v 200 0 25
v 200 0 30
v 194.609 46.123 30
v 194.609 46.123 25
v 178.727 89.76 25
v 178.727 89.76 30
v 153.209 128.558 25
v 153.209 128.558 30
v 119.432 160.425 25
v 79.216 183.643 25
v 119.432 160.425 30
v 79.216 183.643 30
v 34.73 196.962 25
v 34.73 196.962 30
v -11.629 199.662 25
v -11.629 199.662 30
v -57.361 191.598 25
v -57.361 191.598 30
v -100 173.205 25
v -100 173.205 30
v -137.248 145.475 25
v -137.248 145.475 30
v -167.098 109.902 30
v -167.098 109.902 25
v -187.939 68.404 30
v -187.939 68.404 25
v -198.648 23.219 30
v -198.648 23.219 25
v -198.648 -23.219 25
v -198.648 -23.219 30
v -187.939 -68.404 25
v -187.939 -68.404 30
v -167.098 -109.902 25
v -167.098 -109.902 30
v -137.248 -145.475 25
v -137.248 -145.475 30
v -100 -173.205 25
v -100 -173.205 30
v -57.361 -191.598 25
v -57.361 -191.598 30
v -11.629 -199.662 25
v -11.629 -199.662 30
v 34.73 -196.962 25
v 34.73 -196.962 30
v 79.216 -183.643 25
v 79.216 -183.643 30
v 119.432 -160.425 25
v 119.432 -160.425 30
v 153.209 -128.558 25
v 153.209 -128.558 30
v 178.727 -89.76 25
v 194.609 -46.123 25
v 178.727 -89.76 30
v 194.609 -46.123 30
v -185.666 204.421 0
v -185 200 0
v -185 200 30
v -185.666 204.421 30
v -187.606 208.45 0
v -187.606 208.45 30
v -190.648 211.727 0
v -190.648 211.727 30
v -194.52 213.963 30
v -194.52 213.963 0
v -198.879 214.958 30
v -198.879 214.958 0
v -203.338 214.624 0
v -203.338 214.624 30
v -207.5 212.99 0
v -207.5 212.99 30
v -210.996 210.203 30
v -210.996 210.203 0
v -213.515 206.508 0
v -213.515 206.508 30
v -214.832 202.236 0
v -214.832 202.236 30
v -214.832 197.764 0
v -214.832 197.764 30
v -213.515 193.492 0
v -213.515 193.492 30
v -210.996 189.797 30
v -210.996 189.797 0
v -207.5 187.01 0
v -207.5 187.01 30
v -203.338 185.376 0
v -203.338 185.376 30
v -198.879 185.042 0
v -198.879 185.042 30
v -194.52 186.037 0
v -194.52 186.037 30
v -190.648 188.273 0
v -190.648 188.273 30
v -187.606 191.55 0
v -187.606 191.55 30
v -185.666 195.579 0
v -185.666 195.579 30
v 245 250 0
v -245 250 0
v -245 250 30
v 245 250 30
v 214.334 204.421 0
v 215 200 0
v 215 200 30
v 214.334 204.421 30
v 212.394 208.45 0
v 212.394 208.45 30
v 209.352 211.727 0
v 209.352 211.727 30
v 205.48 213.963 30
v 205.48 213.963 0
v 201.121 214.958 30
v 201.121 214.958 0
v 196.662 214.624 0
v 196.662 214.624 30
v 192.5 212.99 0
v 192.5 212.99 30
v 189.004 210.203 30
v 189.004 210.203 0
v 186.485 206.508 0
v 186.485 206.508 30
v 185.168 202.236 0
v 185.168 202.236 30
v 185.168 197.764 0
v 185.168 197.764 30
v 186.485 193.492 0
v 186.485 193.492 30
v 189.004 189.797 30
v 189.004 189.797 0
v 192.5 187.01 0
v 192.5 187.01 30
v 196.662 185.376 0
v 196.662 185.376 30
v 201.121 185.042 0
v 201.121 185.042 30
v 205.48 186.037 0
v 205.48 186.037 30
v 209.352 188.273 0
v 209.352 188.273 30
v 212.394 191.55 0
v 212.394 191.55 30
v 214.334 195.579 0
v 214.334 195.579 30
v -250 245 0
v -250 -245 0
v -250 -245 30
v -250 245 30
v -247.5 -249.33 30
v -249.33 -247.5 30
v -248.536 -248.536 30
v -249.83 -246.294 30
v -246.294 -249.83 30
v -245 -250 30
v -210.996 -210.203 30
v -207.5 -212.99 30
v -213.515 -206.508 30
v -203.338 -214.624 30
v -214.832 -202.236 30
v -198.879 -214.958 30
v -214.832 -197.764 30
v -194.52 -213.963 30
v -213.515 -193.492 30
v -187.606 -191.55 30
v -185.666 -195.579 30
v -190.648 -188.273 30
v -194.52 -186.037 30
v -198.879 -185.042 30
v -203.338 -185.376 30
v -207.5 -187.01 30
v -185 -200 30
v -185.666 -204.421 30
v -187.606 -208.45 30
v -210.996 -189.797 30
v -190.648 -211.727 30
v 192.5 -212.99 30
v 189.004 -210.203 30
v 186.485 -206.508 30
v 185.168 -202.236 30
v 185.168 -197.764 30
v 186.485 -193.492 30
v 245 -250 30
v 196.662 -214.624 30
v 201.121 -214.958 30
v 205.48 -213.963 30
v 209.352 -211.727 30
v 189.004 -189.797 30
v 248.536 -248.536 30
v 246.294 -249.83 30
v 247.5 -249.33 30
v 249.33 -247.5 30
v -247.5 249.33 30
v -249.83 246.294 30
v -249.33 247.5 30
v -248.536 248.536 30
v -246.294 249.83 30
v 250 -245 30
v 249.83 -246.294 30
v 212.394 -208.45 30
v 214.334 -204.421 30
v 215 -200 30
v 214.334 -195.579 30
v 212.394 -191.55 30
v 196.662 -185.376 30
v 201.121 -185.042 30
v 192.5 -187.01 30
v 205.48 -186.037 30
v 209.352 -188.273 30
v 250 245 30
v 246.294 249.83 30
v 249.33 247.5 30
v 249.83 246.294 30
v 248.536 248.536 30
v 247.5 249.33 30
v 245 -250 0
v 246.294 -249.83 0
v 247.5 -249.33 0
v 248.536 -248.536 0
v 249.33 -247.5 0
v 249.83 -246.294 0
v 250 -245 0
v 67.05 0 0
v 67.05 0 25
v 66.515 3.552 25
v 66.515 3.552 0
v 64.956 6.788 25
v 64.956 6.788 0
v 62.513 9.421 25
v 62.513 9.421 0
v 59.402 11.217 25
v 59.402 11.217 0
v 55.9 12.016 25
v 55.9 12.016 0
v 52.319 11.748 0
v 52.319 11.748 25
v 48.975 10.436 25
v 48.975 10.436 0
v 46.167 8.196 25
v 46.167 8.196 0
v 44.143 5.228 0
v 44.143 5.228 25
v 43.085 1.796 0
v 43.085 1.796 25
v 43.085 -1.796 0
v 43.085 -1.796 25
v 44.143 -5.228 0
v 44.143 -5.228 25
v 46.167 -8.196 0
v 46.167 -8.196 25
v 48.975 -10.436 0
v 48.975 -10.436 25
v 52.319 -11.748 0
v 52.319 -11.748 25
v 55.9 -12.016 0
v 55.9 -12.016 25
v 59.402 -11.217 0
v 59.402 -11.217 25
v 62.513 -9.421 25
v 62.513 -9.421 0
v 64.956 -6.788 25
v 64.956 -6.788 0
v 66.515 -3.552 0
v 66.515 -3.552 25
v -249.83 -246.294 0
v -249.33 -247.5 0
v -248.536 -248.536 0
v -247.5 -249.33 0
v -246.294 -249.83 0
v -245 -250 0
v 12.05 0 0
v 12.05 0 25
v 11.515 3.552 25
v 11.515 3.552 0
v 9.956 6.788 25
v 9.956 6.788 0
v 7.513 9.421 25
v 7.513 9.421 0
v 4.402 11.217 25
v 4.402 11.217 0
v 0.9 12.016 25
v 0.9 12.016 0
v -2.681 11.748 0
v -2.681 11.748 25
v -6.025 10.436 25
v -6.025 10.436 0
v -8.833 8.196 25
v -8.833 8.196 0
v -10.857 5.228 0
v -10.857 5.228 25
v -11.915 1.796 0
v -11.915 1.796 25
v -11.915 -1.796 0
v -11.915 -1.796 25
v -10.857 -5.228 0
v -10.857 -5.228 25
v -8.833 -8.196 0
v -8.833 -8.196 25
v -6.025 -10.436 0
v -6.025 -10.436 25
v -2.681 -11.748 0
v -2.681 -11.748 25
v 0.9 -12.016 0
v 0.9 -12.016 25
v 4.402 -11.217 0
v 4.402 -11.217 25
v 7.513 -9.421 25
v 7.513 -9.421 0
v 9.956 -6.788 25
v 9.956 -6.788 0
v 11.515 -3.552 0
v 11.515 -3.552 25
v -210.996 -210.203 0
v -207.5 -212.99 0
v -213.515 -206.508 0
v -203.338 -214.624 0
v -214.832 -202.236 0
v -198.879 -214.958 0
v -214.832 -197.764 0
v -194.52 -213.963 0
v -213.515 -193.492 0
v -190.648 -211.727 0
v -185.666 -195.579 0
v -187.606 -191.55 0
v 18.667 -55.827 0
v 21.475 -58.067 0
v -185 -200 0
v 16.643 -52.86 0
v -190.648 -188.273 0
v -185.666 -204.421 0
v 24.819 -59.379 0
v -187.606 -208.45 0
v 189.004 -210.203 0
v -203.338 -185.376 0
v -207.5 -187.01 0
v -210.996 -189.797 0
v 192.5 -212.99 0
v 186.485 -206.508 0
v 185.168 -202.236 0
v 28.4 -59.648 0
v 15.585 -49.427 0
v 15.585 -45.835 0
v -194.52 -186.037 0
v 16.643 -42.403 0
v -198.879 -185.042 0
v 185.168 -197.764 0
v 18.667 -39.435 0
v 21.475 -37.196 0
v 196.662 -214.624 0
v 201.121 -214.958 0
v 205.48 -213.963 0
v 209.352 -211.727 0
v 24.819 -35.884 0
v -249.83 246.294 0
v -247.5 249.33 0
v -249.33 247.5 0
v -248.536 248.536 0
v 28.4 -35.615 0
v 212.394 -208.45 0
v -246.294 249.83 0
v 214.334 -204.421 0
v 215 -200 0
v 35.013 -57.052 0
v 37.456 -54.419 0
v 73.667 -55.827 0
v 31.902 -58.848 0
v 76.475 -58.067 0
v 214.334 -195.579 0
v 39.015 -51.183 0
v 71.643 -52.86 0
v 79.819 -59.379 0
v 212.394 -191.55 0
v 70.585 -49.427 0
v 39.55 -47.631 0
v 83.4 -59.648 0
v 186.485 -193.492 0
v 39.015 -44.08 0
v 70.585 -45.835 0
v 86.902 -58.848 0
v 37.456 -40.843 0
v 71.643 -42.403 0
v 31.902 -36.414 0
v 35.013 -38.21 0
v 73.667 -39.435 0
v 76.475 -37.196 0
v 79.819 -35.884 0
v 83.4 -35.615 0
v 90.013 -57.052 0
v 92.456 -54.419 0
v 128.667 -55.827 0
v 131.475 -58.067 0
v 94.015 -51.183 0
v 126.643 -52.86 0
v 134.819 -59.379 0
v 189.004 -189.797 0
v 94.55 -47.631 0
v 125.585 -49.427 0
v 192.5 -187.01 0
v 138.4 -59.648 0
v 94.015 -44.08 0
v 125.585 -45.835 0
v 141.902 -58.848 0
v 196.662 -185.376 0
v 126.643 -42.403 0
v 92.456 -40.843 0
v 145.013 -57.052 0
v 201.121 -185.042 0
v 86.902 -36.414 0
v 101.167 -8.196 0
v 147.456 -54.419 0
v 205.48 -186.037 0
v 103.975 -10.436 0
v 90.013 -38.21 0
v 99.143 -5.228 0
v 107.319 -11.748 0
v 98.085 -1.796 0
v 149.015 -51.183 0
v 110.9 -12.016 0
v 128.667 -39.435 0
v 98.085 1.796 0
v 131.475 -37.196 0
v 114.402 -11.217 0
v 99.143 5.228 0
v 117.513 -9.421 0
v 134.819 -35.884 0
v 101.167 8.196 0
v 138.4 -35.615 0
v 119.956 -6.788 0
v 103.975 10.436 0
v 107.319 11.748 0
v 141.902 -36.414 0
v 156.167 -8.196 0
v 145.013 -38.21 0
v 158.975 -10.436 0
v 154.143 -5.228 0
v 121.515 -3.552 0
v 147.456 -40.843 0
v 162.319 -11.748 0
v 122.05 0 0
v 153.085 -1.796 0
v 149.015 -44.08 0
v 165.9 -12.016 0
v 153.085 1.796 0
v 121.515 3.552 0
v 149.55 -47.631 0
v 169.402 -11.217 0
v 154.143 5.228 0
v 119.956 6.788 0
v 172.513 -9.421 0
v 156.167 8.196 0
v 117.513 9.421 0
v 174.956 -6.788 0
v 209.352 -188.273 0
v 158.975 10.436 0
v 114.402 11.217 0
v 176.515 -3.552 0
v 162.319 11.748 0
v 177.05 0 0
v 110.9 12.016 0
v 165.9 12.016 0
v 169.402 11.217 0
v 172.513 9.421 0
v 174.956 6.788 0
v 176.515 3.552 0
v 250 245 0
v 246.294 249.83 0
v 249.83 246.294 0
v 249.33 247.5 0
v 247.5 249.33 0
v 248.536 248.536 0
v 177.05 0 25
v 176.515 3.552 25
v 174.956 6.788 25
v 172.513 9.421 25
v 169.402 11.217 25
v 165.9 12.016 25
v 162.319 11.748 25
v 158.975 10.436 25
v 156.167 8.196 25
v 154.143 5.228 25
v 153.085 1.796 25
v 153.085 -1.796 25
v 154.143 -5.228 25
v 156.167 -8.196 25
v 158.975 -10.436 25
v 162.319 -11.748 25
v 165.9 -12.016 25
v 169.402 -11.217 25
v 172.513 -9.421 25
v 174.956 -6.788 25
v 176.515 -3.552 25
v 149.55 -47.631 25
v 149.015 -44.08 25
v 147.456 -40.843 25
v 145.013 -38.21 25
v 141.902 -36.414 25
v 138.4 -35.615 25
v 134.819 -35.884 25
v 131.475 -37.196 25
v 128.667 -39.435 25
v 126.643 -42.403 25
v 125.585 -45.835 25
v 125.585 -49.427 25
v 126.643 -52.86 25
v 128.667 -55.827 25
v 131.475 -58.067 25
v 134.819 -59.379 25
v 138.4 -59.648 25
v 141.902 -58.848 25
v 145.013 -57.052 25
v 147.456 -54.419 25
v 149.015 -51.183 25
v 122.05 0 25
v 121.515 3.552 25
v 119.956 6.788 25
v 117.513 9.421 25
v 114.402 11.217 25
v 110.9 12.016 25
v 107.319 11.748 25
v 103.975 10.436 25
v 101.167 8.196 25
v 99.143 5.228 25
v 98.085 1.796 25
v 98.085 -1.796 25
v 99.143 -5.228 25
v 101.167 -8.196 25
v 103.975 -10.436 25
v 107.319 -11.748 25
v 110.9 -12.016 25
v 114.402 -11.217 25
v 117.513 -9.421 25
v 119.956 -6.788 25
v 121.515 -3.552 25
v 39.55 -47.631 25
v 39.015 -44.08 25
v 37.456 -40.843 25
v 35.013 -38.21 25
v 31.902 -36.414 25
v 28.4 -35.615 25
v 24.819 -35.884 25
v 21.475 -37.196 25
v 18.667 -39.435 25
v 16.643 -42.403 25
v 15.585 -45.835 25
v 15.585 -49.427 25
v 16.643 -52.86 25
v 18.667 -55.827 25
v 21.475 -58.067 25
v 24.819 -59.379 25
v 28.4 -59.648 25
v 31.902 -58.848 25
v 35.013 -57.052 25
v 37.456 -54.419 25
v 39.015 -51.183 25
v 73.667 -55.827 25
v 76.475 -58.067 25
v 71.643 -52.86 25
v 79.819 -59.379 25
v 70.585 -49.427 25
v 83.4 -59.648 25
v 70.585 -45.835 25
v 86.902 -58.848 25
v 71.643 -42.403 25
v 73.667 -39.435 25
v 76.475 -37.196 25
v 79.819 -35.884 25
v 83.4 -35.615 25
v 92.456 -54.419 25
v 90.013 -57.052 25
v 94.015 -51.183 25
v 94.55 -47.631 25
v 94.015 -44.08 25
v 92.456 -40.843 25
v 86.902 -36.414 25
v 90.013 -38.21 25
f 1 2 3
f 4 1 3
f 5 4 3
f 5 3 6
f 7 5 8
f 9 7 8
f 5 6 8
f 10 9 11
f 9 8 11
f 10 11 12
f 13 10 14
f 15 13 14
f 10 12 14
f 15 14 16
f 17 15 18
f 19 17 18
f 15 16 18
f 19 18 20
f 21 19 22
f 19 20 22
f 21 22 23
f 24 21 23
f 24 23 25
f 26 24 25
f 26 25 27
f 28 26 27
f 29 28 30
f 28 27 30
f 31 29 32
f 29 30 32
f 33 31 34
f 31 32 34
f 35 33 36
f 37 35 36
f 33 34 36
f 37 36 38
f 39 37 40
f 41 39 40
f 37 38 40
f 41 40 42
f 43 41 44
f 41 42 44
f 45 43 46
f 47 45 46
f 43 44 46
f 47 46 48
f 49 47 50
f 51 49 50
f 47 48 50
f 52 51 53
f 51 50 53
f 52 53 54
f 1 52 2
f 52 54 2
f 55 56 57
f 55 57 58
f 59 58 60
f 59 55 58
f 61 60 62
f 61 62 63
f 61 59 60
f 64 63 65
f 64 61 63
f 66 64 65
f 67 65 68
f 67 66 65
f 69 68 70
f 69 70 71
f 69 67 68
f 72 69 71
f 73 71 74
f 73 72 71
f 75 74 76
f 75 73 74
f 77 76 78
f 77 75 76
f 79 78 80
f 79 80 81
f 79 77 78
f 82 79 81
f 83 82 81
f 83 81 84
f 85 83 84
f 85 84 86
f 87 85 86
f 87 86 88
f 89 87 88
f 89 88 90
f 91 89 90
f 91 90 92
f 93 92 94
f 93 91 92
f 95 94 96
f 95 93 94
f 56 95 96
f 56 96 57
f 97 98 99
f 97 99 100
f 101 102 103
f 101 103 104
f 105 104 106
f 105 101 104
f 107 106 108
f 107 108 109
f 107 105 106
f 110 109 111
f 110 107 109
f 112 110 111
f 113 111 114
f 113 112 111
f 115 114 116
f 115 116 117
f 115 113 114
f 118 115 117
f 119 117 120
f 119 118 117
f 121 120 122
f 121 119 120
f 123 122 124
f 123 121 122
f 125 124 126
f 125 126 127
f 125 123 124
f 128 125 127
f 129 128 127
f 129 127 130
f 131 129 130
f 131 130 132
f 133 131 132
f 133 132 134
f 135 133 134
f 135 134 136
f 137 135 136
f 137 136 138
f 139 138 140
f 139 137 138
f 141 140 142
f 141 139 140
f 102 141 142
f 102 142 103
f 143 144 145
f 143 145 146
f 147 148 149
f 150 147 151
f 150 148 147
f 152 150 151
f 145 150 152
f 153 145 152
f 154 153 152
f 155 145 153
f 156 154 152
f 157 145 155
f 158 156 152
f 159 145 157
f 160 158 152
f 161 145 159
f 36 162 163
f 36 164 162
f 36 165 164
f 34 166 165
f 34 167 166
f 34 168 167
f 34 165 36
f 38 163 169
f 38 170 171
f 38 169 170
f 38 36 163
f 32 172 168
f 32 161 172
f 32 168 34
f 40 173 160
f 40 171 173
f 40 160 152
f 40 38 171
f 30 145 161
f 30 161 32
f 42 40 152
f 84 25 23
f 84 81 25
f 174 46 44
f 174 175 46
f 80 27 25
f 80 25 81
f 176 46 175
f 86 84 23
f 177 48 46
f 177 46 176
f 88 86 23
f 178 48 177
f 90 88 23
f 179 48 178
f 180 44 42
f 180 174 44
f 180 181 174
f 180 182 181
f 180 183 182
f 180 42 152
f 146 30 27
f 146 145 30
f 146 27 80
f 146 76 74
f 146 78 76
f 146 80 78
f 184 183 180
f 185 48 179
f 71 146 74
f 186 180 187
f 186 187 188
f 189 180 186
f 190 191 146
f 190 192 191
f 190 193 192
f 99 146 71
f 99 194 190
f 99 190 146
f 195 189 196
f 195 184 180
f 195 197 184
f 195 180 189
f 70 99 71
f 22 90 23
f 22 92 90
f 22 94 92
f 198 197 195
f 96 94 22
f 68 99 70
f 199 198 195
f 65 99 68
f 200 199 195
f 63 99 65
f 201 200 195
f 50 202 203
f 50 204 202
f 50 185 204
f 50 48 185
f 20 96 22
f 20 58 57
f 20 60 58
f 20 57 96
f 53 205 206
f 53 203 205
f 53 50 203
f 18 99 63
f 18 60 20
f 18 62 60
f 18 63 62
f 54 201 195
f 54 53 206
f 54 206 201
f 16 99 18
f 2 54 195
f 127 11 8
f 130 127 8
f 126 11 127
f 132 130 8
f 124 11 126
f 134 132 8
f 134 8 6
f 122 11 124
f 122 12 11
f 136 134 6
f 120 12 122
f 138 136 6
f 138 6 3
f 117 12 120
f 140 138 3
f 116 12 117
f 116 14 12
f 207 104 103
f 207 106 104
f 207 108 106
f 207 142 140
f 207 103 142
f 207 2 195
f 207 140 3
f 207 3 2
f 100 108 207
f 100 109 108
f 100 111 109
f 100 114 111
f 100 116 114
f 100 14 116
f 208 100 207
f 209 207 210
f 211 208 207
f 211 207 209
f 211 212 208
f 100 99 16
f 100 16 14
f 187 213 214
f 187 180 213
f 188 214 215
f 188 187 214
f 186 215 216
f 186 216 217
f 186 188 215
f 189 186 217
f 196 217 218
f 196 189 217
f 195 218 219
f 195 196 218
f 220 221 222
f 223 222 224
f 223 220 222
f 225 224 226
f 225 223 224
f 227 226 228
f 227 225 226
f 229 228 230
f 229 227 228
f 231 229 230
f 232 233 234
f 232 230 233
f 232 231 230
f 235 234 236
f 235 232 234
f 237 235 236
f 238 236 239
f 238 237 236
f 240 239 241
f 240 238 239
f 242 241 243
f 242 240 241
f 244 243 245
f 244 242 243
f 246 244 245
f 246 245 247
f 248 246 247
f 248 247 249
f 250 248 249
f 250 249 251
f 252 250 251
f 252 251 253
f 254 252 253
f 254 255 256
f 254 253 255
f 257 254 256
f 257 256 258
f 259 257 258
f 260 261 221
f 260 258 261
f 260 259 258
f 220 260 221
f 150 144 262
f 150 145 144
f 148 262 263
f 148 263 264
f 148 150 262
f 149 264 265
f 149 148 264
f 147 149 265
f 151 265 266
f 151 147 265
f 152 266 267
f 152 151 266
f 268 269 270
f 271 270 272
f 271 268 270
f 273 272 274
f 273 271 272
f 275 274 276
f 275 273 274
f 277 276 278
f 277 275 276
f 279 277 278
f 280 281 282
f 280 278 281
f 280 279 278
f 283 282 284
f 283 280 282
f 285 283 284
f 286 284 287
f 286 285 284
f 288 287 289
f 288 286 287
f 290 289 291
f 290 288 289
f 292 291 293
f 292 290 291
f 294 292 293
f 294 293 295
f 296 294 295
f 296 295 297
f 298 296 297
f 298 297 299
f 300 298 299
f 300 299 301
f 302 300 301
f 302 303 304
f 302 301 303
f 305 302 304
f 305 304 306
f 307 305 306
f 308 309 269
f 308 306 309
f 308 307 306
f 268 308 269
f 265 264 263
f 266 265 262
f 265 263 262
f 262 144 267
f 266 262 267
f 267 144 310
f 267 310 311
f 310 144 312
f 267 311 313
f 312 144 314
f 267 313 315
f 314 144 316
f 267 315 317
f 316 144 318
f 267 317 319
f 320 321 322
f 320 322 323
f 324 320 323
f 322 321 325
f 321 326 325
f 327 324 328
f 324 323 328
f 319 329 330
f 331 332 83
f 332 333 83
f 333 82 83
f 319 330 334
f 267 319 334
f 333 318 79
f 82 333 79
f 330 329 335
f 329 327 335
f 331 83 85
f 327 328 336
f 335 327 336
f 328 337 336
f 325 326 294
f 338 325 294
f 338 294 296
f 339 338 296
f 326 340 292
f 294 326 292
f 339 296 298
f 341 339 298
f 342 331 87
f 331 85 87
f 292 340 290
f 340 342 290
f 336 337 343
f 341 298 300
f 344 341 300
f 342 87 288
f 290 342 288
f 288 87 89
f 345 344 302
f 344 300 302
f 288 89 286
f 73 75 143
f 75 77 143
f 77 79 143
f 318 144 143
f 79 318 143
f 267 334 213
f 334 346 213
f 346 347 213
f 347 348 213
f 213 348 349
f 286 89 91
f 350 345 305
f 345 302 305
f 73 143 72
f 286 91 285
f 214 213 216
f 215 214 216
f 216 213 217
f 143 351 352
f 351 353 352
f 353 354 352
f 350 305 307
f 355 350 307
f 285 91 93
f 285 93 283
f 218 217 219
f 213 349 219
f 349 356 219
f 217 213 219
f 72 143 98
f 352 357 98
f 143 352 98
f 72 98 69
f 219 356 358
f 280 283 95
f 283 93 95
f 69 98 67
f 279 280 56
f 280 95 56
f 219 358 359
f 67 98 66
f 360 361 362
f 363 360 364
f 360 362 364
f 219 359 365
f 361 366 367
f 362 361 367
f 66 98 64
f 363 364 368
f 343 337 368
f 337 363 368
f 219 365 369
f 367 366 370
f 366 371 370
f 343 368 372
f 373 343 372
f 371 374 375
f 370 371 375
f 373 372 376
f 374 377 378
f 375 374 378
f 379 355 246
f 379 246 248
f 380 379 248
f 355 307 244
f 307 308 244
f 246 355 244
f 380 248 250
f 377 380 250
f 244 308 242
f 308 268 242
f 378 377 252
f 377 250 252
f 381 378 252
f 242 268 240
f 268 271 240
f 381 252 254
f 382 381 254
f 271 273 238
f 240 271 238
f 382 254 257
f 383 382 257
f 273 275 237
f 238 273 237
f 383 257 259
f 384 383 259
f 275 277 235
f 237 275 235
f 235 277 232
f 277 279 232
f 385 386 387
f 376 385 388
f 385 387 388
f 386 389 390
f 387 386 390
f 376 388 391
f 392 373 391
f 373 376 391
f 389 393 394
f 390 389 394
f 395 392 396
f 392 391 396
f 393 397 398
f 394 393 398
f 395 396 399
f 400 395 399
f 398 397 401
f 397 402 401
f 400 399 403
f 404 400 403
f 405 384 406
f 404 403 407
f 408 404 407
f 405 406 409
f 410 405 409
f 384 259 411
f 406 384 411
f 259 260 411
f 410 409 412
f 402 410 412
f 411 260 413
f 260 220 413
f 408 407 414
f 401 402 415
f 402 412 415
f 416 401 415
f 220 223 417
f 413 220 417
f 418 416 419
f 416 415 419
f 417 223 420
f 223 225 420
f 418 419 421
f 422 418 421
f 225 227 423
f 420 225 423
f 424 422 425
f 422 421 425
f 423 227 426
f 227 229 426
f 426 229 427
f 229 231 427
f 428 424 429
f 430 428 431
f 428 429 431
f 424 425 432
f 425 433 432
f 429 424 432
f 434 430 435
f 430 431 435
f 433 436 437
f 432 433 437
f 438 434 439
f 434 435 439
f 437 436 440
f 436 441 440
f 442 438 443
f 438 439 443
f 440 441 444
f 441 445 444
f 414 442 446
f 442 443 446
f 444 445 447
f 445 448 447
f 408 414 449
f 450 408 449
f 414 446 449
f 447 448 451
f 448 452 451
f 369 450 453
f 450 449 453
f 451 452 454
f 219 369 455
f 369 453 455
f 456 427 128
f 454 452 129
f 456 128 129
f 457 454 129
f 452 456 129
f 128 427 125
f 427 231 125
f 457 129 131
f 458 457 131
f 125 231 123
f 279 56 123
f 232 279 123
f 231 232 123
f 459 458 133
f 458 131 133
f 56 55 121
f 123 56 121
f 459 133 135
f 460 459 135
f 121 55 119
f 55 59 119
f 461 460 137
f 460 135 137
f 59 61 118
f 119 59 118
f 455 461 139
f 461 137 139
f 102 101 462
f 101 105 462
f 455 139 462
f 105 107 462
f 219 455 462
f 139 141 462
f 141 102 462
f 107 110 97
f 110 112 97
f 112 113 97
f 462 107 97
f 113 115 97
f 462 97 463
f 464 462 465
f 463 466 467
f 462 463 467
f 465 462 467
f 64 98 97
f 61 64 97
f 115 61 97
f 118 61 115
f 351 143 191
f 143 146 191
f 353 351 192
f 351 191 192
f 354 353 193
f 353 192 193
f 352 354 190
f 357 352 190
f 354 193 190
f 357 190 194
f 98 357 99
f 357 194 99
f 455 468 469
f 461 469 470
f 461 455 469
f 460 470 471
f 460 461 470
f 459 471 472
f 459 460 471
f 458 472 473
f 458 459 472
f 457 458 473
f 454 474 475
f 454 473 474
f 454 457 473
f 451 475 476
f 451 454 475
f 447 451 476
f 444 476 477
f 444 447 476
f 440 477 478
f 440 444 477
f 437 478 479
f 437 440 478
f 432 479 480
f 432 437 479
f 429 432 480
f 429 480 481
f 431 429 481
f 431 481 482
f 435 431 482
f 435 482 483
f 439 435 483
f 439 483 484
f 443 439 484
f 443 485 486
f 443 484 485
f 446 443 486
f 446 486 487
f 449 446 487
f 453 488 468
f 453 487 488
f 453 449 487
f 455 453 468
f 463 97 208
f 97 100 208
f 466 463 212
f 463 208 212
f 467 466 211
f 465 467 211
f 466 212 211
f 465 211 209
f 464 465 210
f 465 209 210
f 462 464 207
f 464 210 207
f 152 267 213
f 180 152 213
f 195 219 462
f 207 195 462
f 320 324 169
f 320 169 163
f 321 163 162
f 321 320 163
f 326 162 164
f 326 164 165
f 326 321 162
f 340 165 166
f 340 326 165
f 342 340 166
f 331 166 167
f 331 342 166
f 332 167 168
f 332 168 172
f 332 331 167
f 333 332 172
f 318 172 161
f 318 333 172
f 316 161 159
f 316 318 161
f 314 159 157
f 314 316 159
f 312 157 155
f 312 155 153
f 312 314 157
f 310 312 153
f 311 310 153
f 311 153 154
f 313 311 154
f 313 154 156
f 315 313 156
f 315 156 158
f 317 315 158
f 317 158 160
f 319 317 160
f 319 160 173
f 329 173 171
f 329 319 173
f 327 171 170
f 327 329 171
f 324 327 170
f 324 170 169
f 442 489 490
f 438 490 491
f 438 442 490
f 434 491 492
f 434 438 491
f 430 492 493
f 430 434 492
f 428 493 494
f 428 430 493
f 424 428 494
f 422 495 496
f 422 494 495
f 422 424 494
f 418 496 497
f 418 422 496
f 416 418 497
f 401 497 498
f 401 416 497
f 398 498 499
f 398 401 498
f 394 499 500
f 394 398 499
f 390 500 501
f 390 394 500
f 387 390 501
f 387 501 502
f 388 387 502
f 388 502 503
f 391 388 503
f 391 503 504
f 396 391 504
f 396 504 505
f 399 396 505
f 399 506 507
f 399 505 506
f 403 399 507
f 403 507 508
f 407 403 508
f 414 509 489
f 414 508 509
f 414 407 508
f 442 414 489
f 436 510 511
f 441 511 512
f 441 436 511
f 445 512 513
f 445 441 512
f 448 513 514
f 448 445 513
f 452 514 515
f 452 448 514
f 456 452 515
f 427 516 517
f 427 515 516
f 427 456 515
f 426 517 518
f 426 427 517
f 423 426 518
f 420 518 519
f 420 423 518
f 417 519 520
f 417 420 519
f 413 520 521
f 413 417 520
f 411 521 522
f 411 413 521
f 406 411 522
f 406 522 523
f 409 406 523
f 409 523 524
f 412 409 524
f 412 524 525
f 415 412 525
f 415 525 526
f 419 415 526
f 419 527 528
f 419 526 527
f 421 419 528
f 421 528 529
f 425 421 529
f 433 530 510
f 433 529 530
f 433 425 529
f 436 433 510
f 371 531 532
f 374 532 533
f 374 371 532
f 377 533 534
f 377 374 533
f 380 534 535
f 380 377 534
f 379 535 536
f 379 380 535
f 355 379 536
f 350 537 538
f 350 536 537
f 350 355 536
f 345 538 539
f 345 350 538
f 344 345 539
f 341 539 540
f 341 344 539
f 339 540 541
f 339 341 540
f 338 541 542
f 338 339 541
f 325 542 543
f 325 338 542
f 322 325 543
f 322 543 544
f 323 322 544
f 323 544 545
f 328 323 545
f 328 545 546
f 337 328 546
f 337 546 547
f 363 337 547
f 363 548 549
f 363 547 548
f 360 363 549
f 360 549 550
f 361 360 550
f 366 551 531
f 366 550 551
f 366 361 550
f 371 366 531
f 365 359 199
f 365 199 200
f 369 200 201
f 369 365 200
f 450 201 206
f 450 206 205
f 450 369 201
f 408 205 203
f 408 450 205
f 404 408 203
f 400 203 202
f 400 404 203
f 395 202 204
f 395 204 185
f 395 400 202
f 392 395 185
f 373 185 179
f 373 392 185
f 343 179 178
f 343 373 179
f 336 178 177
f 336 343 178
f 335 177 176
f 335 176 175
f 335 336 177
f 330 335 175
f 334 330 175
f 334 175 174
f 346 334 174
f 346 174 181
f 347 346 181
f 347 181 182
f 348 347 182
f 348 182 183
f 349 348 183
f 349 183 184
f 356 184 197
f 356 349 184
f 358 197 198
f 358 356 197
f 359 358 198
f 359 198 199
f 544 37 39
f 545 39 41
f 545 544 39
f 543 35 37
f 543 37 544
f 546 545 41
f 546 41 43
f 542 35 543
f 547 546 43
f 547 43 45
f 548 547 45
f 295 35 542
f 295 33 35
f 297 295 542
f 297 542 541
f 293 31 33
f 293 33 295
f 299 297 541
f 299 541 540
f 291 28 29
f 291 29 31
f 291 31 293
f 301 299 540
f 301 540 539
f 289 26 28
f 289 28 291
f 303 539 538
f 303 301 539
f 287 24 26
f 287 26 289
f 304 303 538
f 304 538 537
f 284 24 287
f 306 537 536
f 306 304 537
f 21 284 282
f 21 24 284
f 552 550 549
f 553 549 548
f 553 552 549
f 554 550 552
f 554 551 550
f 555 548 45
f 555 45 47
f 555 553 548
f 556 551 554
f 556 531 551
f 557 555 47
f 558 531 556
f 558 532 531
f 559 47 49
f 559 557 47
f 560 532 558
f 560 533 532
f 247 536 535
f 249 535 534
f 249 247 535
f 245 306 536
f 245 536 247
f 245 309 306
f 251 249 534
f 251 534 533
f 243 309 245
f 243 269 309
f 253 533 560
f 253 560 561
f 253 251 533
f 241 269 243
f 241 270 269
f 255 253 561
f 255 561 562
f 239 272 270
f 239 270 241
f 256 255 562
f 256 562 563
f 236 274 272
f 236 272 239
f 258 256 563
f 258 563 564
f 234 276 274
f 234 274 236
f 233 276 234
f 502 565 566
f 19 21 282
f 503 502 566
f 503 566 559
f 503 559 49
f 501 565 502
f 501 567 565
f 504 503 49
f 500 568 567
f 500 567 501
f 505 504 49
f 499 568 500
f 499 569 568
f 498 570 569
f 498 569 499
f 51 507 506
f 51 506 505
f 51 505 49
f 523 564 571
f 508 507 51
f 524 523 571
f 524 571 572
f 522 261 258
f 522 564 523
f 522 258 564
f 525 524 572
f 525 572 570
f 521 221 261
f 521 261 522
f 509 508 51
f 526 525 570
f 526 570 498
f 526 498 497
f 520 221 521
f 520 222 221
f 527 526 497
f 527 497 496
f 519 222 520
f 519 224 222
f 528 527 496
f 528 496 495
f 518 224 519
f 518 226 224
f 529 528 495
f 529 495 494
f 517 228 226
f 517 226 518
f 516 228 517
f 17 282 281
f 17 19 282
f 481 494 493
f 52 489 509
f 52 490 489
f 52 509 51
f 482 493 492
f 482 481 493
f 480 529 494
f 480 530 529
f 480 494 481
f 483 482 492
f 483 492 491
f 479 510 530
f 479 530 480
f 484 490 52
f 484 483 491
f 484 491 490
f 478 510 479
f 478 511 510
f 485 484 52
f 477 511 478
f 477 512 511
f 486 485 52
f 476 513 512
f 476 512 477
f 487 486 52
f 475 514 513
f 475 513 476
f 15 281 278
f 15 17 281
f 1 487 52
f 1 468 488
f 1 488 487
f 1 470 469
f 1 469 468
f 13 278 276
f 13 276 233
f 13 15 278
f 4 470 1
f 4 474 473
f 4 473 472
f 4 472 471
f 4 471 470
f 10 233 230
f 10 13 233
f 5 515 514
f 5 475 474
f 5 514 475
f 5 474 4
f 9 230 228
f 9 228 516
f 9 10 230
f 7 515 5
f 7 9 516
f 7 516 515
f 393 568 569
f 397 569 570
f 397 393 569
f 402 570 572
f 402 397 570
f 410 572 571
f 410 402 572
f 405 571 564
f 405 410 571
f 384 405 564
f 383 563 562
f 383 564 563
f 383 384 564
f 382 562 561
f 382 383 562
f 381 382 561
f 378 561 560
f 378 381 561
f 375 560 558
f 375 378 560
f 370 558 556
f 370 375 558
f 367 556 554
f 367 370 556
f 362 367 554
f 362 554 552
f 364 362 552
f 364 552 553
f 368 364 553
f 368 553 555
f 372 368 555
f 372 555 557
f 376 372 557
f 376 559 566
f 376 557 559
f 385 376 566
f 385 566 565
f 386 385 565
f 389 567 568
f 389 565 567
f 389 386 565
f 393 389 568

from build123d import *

# Parameters (mm, degrees)
F0_W     = 500
F0_H     = 500
F0_R     = 15
F0_R_2   = 12.05
F1_DEPTH = 30
F2_R     = 5
F3_R     = 200
F4_DEPTH = 5


with BuildPart() as f1:
    # F0 (on Top) → F1 (new body)
    with BuildSketch(Plane.XY):
        Rectangle(F0_W, F0_H)
        with Locations((-200, -200)):
            Circle(F0_R, mode=Mode.SUBTRACT)
        with Locations((200, -200)):
            Circle(F0_R, mode=Mode.SUBTRACT)
        with Locations((27.5, -47.631397)):
            Circle(F0_R_2, mode=Mode.SUBTRACT)
        with Locations((82.5, -47.631397)):
            Circle(F0_R_2, mode=Mode.SUBTRACT)
        with Locations((137.5, -47.631397)):
            Circle(F0_R_2, mode=Mode.SUBTRACT)
        with Locations((-200, 200)):
            Circle(F0_R, mode=Mode.SUBTRACT)
        Circle(F0_R_2, mode=Mode.SUBTRACT)
        with Locations((55, 0)):
            Circle(F0_R_2, mode=Mode.SUBTRACT)
        with Locations((110, 0)):
            Circle(F0_R_2, mode=Mode.SUBTRACT)
        with Locations((165, 0)):
            Circle(F0_R_2, mode=Mode.SUBTRACT)
        with Locations((200, 200)):
            Circle(F0_R, mode=Mode.SUBTRACT)
    extrude(amount=F1_DEPTH)

    # F2
    f2_edges = [f1.edges().sort_by_distance(p)[0] for p in [
        (-250, -250, 15),
        (250, -250, 15),
        (250, 250, 15),
        (-250, 250, 15),
    ]]
    fillet(f2_edges, radius=F2_R)

    # F3 (on face) → F4 (cut)
    with BuildSketch(Plane.XY.offset(30)):
        Circle(F3_R)
    extrude(amount=-F4_DEPTH, mode=Mode.SUBTRACT)


solid = f1.part
